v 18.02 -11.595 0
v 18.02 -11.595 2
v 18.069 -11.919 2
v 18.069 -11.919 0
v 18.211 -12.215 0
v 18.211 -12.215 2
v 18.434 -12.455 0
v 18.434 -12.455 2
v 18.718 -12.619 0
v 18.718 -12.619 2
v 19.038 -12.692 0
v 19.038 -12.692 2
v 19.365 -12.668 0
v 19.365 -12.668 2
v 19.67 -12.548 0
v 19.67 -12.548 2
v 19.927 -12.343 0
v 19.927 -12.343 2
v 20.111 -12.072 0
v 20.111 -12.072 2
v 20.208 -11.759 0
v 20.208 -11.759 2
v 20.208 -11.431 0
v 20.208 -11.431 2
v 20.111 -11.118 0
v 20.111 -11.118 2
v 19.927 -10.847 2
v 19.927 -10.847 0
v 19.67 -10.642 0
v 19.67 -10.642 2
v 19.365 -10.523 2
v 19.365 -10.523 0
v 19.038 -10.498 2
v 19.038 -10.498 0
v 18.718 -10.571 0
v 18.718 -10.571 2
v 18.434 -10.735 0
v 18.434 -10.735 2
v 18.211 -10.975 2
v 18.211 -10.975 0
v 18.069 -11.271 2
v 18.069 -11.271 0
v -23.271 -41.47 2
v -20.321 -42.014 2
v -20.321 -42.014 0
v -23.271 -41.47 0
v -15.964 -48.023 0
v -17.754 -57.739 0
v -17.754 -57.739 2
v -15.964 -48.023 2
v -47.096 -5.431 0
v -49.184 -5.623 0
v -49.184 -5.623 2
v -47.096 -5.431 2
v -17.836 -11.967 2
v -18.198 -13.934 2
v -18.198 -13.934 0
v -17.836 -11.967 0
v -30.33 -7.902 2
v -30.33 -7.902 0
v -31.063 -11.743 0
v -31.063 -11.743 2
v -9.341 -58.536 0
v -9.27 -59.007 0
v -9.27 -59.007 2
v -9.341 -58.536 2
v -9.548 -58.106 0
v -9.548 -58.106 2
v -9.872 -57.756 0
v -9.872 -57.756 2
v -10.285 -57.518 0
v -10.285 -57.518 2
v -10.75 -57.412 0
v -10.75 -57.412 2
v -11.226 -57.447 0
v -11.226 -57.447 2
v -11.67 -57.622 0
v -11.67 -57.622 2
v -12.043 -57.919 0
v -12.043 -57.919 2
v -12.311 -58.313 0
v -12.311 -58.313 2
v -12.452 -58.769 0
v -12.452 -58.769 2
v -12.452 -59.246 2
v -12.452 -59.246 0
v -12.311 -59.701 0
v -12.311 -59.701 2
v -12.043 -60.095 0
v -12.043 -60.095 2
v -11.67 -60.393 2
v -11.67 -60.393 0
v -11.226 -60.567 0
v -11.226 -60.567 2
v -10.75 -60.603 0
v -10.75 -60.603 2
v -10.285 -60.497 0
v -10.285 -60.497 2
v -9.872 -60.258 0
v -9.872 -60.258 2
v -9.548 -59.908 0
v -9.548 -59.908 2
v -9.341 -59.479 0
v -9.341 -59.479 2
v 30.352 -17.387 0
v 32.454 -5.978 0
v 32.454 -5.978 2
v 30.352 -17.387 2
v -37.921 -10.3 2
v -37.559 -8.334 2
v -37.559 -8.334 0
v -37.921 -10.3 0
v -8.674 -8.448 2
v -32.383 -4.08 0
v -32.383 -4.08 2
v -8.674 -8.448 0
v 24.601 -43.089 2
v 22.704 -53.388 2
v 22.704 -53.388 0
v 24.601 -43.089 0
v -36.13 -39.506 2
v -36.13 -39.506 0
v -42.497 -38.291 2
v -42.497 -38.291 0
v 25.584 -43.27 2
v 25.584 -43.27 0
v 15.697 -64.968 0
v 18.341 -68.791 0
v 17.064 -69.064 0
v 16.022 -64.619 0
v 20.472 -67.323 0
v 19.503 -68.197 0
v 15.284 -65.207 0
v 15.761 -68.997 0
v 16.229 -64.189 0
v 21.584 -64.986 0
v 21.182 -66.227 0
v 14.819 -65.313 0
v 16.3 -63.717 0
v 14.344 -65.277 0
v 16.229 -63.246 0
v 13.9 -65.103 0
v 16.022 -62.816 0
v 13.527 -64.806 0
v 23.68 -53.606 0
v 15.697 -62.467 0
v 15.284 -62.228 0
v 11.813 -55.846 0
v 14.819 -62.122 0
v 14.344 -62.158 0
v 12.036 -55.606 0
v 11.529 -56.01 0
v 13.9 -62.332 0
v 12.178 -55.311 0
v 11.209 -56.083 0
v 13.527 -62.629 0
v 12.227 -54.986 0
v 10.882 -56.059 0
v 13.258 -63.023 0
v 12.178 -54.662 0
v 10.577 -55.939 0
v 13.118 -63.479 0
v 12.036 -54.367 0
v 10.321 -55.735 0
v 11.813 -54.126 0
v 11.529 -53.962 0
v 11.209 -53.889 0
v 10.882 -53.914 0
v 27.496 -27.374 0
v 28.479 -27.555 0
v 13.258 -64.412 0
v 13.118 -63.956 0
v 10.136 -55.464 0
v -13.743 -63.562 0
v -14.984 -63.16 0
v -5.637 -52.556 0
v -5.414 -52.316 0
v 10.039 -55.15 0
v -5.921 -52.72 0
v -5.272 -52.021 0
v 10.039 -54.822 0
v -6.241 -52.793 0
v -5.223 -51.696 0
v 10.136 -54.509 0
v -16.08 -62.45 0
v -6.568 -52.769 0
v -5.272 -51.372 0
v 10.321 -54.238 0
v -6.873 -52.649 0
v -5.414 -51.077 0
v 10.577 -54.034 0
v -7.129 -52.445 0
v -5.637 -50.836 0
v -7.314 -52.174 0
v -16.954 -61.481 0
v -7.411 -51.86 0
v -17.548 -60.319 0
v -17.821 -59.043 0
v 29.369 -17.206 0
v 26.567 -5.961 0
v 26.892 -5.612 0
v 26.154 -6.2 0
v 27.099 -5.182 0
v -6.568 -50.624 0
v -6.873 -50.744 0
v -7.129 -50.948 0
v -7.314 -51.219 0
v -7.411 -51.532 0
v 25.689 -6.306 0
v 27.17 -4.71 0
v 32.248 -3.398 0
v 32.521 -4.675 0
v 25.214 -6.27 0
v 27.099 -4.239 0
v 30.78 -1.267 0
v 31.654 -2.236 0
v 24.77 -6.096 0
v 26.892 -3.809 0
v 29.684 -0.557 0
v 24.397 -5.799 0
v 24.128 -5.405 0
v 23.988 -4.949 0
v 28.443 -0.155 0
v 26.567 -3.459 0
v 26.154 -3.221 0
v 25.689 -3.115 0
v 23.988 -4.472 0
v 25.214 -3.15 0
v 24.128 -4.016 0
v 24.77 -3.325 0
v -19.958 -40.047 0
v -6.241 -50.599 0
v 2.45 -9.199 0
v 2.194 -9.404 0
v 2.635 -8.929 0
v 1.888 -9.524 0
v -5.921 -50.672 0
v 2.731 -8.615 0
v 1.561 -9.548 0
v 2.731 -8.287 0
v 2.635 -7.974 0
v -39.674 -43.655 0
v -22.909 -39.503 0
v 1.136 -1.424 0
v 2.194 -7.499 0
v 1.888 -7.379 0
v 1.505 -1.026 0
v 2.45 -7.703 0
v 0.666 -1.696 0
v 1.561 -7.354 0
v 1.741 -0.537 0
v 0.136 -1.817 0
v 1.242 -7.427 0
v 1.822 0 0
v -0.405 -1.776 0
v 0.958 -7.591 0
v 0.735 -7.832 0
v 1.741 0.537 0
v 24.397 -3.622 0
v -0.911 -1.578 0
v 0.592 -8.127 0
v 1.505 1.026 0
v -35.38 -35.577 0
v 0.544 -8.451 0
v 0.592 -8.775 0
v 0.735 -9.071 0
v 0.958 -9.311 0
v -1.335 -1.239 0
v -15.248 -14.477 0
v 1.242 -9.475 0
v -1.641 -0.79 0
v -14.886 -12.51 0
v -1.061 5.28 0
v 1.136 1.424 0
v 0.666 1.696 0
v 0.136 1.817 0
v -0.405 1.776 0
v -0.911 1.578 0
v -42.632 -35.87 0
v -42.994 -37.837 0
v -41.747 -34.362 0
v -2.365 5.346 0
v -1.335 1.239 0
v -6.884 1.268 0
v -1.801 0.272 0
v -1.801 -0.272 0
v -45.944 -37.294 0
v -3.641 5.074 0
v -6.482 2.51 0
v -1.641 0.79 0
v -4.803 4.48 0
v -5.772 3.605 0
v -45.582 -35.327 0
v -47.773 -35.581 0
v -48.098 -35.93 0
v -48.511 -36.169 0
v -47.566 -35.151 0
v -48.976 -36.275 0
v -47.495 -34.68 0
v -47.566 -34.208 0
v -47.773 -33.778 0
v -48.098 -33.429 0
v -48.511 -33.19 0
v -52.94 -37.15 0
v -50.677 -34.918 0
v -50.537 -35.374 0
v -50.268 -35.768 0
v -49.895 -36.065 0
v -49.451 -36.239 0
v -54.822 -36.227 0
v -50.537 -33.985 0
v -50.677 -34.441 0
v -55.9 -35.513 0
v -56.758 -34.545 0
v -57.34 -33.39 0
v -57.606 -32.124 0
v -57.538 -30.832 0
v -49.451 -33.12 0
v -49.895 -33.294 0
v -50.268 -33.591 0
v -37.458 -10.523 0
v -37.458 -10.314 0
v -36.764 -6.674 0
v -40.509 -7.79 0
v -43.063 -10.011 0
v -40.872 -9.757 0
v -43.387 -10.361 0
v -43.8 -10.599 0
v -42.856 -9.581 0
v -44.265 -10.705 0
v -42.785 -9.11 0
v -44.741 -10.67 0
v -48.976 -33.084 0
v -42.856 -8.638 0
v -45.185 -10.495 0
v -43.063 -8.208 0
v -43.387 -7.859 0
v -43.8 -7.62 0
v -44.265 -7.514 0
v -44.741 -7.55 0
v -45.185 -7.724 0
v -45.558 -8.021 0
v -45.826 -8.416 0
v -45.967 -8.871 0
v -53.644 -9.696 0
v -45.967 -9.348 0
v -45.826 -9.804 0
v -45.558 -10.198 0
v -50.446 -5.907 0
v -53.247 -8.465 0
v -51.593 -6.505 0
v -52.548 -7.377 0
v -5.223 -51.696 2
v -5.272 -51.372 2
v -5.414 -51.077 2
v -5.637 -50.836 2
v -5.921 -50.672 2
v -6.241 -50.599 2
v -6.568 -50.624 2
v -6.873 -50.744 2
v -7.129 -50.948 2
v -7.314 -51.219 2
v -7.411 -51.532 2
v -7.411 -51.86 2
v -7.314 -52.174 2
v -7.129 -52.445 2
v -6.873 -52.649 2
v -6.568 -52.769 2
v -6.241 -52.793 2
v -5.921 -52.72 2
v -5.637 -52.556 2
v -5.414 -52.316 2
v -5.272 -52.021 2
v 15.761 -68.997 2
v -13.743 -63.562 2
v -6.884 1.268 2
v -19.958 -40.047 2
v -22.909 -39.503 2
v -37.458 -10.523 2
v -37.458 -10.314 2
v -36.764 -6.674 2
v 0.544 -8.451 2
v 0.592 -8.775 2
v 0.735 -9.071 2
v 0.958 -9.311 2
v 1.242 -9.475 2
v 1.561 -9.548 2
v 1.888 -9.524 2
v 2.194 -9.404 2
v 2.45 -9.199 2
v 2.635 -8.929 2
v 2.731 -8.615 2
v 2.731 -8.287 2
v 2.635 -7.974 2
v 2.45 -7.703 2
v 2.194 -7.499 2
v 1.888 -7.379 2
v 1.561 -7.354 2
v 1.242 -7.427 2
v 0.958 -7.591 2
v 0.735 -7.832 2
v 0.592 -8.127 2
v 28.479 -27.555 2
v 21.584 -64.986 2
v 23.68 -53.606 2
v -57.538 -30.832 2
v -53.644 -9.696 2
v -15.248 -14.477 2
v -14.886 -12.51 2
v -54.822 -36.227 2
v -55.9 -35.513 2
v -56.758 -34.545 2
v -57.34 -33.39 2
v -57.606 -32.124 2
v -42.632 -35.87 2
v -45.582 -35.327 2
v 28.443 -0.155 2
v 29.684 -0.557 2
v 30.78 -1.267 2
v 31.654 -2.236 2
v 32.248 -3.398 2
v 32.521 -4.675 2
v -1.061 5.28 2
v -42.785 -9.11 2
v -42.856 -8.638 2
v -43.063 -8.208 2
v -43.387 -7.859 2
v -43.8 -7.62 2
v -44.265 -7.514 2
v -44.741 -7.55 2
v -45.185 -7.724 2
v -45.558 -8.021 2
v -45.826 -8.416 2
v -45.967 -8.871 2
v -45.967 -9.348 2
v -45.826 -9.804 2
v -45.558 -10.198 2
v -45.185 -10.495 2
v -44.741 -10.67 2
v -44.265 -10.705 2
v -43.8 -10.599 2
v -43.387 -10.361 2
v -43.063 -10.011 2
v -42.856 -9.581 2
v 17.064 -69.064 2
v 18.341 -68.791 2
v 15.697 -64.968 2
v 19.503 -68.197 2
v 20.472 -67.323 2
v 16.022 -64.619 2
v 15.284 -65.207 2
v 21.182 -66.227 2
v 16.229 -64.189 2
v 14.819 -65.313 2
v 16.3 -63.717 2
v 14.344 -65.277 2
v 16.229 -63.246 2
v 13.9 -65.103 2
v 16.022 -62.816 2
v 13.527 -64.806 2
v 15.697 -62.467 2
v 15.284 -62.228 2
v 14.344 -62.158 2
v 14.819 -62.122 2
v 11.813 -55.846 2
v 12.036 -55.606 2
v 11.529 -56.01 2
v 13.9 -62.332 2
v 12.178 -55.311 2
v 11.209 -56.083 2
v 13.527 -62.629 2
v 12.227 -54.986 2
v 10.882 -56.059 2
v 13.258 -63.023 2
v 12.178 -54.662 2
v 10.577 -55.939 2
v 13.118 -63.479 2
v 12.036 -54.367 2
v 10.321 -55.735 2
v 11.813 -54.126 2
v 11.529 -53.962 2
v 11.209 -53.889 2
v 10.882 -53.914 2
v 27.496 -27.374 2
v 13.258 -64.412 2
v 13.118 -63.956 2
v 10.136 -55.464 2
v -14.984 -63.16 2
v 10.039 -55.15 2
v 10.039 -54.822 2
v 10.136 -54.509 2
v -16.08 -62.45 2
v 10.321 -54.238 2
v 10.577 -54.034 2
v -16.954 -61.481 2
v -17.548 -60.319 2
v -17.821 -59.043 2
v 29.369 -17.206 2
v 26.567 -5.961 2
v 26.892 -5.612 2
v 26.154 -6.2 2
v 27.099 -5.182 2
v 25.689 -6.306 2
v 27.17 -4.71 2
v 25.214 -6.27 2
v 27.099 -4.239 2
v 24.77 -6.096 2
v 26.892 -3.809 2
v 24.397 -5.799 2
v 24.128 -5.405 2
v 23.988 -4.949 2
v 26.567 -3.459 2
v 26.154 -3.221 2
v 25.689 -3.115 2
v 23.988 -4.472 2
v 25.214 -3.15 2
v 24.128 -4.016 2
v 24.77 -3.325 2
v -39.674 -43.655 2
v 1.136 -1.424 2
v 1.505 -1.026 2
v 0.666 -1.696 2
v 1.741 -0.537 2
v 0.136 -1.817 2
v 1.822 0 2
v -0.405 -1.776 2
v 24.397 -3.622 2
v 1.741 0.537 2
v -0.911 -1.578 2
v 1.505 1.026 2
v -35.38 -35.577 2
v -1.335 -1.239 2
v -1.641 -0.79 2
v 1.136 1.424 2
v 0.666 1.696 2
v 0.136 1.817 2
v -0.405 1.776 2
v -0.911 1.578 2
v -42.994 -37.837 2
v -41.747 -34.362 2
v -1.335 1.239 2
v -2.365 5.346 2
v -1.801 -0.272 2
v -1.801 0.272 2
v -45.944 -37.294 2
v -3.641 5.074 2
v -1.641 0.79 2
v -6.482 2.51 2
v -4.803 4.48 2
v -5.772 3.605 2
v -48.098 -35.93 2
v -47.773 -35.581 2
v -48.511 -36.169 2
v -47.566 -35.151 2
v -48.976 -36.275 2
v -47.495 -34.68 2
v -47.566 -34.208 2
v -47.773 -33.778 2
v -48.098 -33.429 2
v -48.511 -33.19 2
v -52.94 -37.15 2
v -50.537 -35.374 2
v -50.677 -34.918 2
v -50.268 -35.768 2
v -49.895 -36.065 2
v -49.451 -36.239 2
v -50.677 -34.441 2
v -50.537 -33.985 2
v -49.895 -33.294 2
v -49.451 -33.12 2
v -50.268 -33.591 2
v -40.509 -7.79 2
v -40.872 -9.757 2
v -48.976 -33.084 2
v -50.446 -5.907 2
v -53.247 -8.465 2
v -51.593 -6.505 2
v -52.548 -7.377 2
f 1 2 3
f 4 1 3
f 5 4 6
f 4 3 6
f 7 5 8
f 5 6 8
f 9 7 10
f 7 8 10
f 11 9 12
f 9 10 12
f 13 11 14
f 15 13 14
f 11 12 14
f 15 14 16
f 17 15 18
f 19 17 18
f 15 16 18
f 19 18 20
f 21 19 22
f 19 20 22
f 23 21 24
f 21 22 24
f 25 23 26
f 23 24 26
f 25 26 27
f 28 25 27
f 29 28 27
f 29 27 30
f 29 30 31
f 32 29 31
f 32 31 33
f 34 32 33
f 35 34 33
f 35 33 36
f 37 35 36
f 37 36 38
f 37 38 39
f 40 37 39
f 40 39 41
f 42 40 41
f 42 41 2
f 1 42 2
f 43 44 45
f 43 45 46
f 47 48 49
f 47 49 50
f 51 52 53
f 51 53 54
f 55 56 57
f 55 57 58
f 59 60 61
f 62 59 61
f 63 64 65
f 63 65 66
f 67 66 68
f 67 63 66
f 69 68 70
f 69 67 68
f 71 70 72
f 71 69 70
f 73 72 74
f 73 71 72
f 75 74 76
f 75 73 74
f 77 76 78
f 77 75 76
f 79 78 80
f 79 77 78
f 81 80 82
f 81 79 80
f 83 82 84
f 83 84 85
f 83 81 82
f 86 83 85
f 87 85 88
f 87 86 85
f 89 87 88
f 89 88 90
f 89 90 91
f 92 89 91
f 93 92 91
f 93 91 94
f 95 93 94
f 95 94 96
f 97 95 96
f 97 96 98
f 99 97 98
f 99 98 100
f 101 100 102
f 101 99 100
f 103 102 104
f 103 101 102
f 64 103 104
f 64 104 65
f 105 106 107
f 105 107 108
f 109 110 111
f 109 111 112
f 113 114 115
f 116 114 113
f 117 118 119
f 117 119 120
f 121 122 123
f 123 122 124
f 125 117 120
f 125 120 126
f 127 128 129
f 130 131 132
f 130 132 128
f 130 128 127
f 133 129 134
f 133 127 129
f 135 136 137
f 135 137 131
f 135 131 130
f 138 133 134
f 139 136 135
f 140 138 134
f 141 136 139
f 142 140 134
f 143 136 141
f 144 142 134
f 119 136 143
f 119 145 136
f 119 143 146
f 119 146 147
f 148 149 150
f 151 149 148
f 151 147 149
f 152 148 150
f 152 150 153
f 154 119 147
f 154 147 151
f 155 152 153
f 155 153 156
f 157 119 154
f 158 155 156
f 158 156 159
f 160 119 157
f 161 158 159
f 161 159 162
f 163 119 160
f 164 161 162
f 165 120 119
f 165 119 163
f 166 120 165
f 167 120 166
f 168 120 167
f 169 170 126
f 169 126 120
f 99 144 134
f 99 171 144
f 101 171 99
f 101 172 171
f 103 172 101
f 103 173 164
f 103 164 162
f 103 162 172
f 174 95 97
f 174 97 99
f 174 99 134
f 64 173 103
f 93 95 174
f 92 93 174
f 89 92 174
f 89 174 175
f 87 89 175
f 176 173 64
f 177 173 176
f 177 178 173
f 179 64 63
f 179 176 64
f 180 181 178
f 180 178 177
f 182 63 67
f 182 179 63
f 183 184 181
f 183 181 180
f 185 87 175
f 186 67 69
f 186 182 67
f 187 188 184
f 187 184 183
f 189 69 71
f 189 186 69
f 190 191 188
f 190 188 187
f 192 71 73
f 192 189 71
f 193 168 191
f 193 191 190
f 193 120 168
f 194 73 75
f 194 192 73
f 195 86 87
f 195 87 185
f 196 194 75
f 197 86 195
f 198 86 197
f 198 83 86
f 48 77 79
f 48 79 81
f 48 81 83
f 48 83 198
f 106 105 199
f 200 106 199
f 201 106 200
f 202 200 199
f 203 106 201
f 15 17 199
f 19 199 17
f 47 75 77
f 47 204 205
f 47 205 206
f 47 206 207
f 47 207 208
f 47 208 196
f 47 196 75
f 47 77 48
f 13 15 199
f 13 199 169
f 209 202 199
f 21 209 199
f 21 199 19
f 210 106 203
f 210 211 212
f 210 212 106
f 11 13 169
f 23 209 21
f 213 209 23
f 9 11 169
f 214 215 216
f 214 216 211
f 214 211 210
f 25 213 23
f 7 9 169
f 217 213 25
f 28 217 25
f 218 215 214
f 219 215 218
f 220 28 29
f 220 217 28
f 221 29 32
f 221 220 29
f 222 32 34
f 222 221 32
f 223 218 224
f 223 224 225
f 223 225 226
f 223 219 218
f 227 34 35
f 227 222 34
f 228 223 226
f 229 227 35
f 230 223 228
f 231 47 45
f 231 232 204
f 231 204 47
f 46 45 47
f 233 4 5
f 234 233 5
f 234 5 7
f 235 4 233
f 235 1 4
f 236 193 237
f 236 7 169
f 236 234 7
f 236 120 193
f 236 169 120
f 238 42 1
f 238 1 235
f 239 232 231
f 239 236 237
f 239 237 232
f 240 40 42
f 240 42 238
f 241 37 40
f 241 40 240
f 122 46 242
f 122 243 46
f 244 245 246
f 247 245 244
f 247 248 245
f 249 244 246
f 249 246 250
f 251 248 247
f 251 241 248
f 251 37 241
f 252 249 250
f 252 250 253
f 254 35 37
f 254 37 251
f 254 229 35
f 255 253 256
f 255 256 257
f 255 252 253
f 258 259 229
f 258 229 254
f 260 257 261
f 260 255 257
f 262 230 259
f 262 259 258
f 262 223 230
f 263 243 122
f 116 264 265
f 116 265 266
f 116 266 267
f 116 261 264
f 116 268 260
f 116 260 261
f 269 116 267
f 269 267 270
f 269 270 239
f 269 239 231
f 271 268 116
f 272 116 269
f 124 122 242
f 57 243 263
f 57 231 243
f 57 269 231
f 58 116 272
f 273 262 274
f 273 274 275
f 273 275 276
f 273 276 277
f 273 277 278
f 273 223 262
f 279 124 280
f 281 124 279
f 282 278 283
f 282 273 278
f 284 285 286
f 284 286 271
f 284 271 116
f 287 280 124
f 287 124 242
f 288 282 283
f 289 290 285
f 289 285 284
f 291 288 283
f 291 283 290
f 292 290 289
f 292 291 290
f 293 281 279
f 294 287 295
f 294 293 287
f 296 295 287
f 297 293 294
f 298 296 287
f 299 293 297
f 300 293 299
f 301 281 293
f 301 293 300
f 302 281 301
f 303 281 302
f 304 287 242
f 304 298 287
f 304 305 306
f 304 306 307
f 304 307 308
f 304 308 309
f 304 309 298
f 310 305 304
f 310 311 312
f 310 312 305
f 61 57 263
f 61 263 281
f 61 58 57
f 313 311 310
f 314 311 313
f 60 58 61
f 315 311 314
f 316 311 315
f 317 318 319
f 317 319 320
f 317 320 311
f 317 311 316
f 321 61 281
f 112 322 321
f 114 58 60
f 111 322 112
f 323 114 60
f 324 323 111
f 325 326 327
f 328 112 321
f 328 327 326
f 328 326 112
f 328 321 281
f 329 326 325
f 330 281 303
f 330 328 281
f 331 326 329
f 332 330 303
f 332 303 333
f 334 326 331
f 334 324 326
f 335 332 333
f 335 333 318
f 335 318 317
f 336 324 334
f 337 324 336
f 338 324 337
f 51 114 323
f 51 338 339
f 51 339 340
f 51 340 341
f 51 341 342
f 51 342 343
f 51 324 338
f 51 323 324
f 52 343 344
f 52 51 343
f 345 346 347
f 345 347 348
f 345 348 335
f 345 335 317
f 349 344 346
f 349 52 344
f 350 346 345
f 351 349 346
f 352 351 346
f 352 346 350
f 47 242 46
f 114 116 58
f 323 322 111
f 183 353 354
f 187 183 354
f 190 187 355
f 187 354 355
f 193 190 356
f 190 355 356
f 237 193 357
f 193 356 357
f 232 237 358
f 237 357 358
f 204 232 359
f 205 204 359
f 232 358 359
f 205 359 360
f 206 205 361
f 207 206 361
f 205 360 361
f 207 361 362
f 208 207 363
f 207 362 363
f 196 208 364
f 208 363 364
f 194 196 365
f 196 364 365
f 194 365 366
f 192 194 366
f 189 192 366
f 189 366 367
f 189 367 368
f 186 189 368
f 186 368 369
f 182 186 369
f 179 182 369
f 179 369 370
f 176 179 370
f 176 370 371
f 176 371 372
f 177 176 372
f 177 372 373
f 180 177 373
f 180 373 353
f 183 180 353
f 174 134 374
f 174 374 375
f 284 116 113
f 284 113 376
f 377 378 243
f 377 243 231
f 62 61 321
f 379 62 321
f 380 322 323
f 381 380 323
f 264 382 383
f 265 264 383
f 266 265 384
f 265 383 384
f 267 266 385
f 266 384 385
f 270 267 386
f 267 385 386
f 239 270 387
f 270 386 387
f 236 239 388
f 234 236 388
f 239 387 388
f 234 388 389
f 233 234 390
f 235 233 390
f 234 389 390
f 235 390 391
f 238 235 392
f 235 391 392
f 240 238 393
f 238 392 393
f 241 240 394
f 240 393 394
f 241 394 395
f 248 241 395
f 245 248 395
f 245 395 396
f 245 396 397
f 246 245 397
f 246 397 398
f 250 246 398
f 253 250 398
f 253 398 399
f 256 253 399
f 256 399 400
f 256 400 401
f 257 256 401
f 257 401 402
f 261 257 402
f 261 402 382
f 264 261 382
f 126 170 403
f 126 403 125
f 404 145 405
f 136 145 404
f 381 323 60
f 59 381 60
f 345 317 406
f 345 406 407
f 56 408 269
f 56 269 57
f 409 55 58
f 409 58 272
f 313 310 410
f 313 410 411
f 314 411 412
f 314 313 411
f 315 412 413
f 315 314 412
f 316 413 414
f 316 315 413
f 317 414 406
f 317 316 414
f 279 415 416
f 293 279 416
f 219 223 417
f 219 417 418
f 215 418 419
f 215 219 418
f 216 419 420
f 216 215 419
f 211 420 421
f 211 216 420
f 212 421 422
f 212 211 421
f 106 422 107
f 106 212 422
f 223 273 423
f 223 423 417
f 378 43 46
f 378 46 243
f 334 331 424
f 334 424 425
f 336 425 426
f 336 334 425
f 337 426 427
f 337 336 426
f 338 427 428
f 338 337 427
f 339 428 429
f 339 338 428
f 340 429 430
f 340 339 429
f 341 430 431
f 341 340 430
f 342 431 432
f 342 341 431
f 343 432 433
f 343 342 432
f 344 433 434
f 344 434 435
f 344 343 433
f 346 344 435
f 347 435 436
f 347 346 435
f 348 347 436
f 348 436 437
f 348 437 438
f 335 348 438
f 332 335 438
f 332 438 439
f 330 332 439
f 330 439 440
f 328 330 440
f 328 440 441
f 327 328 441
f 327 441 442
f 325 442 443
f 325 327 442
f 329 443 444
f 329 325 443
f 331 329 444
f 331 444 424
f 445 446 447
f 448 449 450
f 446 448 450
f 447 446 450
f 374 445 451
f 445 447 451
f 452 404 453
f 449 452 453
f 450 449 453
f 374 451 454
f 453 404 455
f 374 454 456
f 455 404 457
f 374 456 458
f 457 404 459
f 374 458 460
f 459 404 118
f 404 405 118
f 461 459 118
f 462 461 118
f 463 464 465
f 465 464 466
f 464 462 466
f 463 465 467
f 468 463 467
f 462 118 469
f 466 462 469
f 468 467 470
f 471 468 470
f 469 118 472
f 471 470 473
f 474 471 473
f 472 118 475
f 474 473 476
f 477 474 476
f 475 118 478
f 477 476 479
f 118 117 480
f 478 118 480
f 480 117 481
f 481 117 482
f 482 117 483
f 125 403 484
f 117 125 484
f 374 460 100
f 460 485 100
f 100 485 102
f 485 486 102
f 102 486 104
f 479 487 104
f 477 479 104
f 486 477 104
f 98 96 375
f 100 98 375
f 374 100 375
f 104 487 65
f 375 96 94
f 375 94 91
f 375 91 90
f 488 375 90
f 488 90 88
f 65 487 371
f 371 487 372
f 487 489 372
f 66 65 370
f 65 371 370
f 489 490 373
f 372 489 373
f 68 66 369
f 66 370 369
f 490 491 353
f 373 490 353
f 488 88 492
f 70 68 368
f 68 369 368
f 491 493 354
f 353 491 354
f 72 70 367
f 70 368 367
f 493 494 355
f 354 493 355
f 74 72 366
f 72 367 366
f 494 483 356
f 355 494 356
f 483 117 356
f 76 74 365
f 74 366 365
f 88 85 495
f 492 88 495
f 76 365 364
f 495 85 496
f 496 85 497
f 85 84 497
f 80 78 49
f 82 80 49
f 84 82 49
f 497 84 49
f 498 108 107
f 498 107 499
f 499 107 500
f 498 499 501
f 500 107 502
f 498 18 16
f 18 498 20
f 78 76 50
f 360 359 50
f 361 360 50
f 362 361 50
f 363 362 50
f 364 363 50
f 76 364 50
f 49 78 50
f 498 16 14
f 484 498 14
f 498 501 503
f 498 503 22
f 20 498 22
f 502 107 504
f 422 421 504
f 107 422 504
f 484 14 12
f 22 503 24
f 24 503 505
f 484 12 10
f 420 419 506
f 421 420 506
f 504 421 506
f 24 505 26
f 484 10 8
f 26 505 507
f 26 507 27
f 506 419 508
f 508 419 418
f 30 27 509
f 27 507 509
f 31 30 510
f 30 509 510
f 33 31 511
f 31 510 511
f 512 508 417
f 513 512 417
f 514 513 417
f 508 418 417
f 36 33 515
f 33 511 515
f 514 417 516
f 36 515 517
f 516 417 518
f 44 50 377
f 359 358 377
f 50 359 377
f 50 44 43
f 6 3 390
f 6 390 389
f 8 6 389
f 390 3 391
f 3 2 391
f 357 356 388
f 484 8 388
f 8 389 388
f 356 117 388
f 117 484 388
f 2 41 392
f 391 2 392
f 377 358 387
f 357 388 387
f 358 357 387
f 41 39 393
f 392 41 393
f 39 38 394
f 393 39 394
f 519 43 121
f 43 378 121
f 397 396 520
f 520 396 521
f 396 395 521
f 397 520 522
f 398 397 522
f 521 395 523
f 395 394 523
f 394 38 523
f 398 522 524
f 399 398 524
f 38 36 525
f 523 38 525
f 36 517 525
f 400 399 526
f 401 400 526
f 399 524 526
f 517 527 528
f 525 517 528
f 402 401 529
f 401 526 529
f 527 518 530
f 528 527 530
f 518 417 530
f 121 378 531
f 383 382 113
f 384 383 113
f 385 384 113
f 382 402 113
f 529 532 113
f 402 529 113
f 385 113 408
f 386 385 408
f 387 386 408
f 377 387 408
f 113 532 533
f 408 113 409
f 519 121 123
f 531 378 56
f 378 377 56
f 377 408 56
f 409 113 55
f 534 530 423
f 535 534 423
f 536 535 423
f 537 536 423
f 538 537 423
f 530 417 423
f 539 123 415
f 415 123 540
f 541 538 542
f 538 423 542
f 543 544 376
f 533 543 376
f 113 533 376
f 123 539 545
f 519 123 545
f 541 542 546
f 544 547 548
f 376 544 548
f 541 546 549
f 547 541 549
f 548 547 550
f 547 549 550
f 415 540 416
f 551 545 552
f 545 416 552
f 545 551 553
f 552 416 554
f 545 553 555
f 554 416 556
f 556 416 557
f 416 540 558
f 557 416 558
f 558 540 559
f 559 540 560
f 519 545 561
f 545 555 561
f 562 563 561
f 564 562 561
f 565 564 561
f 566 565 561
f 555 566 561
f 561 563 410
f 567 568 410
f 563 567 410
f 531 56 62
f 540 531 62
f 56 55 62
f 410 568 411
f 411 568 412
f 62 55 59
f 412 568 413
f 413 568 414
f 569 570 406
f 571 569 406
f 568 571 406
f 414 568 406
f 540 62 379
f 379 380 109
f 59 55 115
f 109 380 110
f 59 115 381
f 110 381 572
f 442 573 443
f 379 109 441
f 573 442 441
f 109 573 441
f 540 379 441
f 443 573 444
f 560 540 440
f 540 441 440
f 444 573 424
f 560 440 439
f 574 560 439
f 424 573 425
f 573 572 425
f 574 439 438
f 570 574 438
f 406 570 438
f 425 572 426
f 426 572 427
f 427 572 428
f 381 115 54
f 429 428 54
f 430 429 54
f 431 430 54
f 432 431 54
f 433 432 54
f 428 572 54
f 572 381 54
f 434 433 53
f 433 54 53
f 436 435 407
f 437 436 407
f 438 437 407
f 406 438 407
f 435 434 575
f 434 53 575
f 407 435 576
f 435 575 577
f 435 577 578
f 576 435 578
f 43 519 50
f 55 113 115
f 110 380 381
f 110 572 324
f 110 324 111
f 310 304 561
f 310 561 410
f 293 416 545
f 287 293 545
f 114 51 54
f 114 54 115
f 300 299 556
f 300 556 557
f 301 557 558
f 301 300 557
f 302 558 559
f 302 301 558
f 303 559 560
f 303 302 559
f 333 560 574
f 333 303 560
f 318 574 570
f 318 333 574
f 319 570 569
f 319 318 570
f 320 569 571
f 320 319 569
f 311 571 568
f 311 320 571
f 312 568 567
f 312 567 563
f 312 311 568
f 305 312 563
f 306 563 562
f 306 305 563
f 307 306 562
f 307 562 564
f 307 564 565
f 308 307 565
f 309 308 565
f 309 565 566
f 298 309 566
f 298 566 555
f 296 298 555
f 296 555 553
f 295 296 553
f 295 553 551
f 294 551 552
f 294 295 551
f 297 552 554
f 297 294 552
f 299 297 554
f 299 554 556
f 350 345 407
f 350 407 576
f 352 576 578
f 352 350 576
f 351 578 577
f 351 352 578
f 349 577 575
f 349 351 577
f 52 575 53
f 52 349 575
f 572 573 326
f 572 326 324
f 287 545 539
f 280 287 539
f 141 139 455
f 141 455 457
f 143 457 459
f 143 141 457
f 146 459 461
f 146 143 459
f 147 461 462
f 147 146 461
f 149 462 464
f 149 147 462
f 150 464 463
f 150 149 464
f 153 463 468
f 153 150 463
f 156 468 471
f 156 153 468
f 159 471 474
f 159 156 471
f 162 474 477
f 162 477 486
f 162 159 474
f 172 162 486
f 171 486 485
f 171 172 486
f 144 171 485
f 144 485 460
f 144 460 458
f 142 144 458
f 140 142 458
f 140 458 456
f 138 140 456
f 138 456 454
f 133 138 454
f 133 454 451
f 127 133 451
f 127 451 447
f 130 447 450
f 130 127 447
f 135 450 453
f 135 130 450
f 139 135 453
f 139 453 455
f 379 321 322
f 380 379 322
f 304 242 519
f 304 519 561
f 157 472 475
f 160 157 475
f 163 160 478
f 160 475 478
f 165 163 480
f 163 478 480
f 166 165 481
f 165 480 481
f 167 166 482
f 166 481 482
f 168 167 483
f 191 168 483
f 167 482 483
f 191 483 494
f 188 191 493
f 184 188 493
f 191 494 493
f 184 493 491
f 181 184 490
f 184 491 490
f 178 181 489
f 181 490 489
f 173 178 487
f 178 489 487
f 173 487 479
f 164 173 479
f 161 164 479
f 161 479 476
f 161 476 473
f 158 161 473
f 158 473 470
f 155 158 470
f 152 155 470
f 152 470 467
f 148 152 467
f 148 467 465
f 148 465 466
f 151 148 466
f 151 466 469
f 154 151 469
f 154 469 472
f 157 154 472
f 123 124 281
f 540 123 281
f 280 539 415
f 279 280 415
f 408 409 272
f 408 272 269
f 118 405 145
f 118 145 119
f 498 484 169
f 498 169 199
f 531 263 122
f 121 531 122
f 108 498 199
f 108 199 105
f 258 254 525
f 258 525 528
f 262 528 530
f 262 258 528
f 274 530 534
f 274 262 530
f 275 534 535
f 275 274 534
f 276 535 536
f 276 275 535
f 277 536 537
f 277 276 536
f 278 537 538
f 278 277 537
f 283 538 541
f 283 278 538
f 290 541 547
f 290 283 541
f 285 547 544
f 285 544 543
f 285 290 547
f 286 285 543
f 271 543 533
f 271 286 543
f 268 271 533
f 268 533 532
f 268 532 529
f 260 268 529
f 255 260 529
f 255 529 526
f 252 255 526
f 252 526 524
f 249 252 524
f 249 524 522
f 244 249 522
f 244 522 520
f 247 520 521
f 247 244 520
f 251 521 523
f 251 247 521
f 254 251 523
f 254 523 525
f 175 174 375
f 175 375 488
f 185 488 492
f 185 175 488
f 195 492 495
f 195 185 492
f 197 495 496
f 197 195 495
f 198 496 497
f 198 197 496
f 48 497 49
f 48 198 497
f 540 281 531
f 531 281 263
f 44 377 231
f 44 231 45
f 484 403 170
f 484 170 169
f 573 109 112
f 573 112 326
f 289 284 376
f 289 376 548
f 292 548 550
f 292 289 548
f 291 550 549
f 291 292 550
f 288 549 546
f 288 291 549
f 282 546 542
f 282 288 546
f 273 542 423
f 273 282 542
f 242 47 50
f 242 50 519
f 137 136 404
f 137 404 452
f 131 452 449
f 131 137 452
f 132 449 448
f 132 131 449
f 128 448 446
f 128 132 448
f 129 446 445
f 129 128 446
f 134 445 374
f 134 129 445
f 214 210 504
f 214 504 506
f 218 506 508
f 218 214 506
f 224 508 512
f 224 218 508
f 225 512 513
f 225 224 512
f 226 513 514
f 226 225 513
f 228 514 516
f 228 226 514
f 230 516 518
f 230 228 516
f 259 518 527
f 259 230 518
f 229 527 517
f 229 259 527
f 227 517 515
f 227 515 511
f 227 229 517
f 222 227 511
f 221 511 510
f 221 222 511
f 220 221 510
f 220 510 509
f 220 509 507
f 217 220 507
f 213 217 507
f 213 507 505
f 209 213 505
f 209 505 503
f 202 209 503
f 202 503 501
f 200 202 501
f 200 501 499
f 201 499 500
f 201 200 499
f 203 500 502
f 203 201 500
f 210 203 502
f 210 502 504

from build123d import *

# Parameters (mm, degrees)
SKETCH1_R           = 1.6
SKETCH1_R_2         = 1.821636576
BOSS_EXTRUDE1_DEPTH = 2
CUT_EXTRUDE1_DEPTH  = 2
CUT_EXTRUDE2_REACH  = 91.979
SKETCH3_R           = 1.1


with BuildPart() as part:
    # Sketch1 → Boss-Extrude1 (new body)
    with BuildSketch(Plane.XY):
        with BuildLine():
            Line((-1.061078705, 5.279593922), (28.442500971, -0.155365716))
            ThreePointArc((28.442500971, -0.155365716), (31.654220711, -2.236114921), (32.453937644, -5.978455602))
            Line((32.453937644, -5.978455602), (21.584018369, -64.985614955))
            ThreePointArc((21.584018369, -64.985614955), (19.503269163, -68.197334694), (15.760928483, -68.997051628))
            Line((15.760928483, -68.997051628), (-13.742651194, -63.56209199))
            ThreePointArc((-13.742651194, -63.56209199), (-16.954370933, -61.481342785), (-17.754087867, -57.739002104))
            Line((-17.754087867, -57.739002104), (-15.96422722, -48.022776093))
            Line((-15.96422722, -48.022776093), (-39.673587654, -43.655190247))
            Line((-39.673587654, -43.655190247), (-52.939586595, -37.150402745))
            Line((-52.939586595, -37.150402745), (-54.821863672, -36.227455859))
            ThreePointArc((-54.821863672, -36.227455859), (-57.086606666, -33.986331814), (-57.537836973, -30.832272681))
            Line((-57.537836973, -30.832272681), (-53.644253203, -9.696023904))
            ThreePointArc((-53.644253203, -9.696023904), (-52.098740676, -6.909791889), (-49.184068361, -5.622786411))
            Line((-49.184068361, -5.622786411), (-47.096468931, -5.431144635))
            Line((-47.096468931, -5.431144635), (-32.383389672, -4.080482917))
            Line((-32.383389672, -4.080482917), (-8.674029238, -8.448068762))
            Line((-8.674029238, -8.448068762), (-6.884168591, 1.268157249))
            ThreePointArc((-6.884168591, 1.268157249), (-4.803419386, 4.479876988), (-1.061078705, 5.279593922))
        make_face()
        with Locations((-44.384822009, -9.109751657)):
            Circle(SKETCH1_R, mode=Mode.SUBTRACT)
        with Locations((-49.095120362, -34.67952071)):
            Circle(SKETCH1_R, mode=Mode.SUBTRACT)
        with Locations((-10.869919276, -59.007159353)):
            Circle(SKETCH1_R, mode=Mode.SUBTRACT)
        with Locations((14.699849777, -63.717457706)):
            Circle(SKETCH1_R, mode=Mode.SUBTRACT)
        Circle(SKETCH1_R_2, mode=Mode.SUBTRACT)
        with Locations((25.569769053, -4.710298353)):
            Circle(SKETCH1_R, mode=Mode.SUBTRACT)
        Polygon((-42.496595483, -38.291112185), (-41.746841807, -34.362402924), (-35.380415499, -35.577369777), (-36.130169175, -39.506079038), align=None, mode=Mode.SUBTRACT)
        Polygon((-37.458250782, -10.313833259), (-36.76371904, -6.674486931), (-30.329701085, -7.902352953), (-31.062719564, -11.743369783), (-37.458250782, -10.522848558), align=None, mode=Mode.SUBTRACT)
    extrude(amount=BOSS_EXTRUDE1_DEPTH)

    # Sketch2 → Cut-Extrude1 (cut)
    with BuildSketch(Plane.XY.offset(2)):
        Polygon((-42.631536652, -35.870200518), (-45.58189462, -35.326704554), (-45.944225262, -37.293609866), (-42.993867295, -37.83710583), align=None)
        Polygon((-40.509265624, -7.790030189), (-37.558907657, -8.333526153), (-37.921238299, -10.300431465), (-40.871596267, -9.756935501), align=None)
        Polygon((-22.908632922, -39.503426957), (-19.958274954, -40.04692292), (-20.320605596, -42.013828232), (-23.270963564, -41.470332268), align=None)
        Polygon((-17.836003926, -11.966752592), (-14.885645959, -12.510248555), (-15.247976601, -14.477153867), (-18.198334569, -13.933657903), align=None)
    extrude(amount=-CUT_EXTRUDE1_DEPTH, mode=Mode.SUBTRACT)

    # Sketch3 → Cut-Extrude2 (cut, up to next)
    with BuildSketch(Plane.XY.offset(2), mode=Mode.PRIVATE) as cut_extrude2_sk1:
        with Locations((-6.322810567, -51.696321435)):
            Circle(SKETCH3_R)
    cut_extrude2_tool1 = extrude(cut_extrude2_sk1.sketch, amount=-CUT_EXTRUDE2_REACH, mode=Mode.PRIVATE) & part.part
    # Sketch3 → Cut-Extrude2 (cut, up to next)
    with BuildSketch(Plane.XY.offset(2), mode=Mode.PRIVATE) as cut_extrude2_sk2:
        with Locations((11.126928282, -54.98634737)):
            Circle(SKETCH3_R)
    cut_extrude2_tool2 = extrude(cut_extrude2_sk2.sketch, amount=-CUT_EXTRUDE2_REACH, mode=Mode.PRIVATE) & part.part
    # Sketch3 → Cut-Extrude2 (cut, up to next)
    with BuildSketch(Plane.XY.offset(2), mode=Mode.PRIVATE) as cut_extrude2_sk3:
        with Locations(Location((19.120179881, -11.595126253, 0), (0, 0, 180))):
            Circle(SKETCH3_R)
    cut_extrude2_tool3 = extrude(cut_extrude2_sk3.sketch, amount=-CUT_EXTRUDE2_REACH, mode=Mode.PRIVATE) & part.part
    # Sketch3 → Cut-Extrude2 (cut, up to next)
    with BuildSketch(Plane.XY.offset(2), mode=Mode.PRIVATE) as cut_extrude2_sk4:
        with Locations(Location((1.64352088, -8.451235874, 0), (0, 0, 180))):
            Circle(SKETCH3_R)
    cut_extrude2_tool4 = extrude(cut_extrude2_sk4.sketch, amount=-CUT_EXTRUDE2_REACH, mode=Mode.PRIVATE) & part.part
    # Sketch3 → Cut-Extrude2 (cut, up to next)
    with BuildSketch(Plane.XY.offset(2), mode=Mode.PRIVATE) as cut_extrude2_sk5:
        Polygon((22.704393125, -53.387885203), (24.600919852, -43.088599847), (25.584372508, -43.269765168), (23.680211994, -53.606465934), align=None)
    cut_extrude2_tool5 = extrude(cut_extrude2_sk5.sketch, amount=-CUT_EXTRUDE2_REACH, mode=Mode.PRIVATE) & part.part
    # Sketch3 → Cut-Extrude2 (cut, up to next)
    with BuildSketch(Plane.XY.offset(2), mode=Mode.PRIVATE) as cut_extrude2_sk6:
        Polygon((28.479203416, -27.555228163), (27.49575076, -27.374062842), (29.36883744, -17.206045825), (30.352290096, -17.387211146), align=None)
    cut_extrude2_tool6 = extrude(cut_extrude2_sk6.sketch, amount=-CUT_EXTRUDE2_REACH, mode=Mode.PRIVATE) & part.part
    add(cut_extrude2_tool1.solids().sort_by_distance((-6.322811, -51.696321, 2))[0], mode=Mode.SUBTRACT)
    add(cut_extrude2_tool2.solids().sort_by_distance((11.126928, -54.986347, 2))[0], mode=Mode.SUBTRACT)
    add(cut_extrude2_tool3.solids().sort_by_distance((19.12018, -11.595126, 2))[0], mode=Mode.SUBTRACT)
    add(cut_extrude2_tool4.solids().sort_by_distance((1.643521, -8.451236, 2))[0], mode=Mode.SUBTRACT)
    add(cut_extrude2_tool5.solids().sort_by_distance((24.142887, -48.337611, 2))[0], mode=Mode.SUBTRACT)
    add(cut_extrude2_tool6.solids().sort_by_distance((28.92402, -22.380637, 2))[0], mode=Mode.SUBTRACT)


solid = part.part
